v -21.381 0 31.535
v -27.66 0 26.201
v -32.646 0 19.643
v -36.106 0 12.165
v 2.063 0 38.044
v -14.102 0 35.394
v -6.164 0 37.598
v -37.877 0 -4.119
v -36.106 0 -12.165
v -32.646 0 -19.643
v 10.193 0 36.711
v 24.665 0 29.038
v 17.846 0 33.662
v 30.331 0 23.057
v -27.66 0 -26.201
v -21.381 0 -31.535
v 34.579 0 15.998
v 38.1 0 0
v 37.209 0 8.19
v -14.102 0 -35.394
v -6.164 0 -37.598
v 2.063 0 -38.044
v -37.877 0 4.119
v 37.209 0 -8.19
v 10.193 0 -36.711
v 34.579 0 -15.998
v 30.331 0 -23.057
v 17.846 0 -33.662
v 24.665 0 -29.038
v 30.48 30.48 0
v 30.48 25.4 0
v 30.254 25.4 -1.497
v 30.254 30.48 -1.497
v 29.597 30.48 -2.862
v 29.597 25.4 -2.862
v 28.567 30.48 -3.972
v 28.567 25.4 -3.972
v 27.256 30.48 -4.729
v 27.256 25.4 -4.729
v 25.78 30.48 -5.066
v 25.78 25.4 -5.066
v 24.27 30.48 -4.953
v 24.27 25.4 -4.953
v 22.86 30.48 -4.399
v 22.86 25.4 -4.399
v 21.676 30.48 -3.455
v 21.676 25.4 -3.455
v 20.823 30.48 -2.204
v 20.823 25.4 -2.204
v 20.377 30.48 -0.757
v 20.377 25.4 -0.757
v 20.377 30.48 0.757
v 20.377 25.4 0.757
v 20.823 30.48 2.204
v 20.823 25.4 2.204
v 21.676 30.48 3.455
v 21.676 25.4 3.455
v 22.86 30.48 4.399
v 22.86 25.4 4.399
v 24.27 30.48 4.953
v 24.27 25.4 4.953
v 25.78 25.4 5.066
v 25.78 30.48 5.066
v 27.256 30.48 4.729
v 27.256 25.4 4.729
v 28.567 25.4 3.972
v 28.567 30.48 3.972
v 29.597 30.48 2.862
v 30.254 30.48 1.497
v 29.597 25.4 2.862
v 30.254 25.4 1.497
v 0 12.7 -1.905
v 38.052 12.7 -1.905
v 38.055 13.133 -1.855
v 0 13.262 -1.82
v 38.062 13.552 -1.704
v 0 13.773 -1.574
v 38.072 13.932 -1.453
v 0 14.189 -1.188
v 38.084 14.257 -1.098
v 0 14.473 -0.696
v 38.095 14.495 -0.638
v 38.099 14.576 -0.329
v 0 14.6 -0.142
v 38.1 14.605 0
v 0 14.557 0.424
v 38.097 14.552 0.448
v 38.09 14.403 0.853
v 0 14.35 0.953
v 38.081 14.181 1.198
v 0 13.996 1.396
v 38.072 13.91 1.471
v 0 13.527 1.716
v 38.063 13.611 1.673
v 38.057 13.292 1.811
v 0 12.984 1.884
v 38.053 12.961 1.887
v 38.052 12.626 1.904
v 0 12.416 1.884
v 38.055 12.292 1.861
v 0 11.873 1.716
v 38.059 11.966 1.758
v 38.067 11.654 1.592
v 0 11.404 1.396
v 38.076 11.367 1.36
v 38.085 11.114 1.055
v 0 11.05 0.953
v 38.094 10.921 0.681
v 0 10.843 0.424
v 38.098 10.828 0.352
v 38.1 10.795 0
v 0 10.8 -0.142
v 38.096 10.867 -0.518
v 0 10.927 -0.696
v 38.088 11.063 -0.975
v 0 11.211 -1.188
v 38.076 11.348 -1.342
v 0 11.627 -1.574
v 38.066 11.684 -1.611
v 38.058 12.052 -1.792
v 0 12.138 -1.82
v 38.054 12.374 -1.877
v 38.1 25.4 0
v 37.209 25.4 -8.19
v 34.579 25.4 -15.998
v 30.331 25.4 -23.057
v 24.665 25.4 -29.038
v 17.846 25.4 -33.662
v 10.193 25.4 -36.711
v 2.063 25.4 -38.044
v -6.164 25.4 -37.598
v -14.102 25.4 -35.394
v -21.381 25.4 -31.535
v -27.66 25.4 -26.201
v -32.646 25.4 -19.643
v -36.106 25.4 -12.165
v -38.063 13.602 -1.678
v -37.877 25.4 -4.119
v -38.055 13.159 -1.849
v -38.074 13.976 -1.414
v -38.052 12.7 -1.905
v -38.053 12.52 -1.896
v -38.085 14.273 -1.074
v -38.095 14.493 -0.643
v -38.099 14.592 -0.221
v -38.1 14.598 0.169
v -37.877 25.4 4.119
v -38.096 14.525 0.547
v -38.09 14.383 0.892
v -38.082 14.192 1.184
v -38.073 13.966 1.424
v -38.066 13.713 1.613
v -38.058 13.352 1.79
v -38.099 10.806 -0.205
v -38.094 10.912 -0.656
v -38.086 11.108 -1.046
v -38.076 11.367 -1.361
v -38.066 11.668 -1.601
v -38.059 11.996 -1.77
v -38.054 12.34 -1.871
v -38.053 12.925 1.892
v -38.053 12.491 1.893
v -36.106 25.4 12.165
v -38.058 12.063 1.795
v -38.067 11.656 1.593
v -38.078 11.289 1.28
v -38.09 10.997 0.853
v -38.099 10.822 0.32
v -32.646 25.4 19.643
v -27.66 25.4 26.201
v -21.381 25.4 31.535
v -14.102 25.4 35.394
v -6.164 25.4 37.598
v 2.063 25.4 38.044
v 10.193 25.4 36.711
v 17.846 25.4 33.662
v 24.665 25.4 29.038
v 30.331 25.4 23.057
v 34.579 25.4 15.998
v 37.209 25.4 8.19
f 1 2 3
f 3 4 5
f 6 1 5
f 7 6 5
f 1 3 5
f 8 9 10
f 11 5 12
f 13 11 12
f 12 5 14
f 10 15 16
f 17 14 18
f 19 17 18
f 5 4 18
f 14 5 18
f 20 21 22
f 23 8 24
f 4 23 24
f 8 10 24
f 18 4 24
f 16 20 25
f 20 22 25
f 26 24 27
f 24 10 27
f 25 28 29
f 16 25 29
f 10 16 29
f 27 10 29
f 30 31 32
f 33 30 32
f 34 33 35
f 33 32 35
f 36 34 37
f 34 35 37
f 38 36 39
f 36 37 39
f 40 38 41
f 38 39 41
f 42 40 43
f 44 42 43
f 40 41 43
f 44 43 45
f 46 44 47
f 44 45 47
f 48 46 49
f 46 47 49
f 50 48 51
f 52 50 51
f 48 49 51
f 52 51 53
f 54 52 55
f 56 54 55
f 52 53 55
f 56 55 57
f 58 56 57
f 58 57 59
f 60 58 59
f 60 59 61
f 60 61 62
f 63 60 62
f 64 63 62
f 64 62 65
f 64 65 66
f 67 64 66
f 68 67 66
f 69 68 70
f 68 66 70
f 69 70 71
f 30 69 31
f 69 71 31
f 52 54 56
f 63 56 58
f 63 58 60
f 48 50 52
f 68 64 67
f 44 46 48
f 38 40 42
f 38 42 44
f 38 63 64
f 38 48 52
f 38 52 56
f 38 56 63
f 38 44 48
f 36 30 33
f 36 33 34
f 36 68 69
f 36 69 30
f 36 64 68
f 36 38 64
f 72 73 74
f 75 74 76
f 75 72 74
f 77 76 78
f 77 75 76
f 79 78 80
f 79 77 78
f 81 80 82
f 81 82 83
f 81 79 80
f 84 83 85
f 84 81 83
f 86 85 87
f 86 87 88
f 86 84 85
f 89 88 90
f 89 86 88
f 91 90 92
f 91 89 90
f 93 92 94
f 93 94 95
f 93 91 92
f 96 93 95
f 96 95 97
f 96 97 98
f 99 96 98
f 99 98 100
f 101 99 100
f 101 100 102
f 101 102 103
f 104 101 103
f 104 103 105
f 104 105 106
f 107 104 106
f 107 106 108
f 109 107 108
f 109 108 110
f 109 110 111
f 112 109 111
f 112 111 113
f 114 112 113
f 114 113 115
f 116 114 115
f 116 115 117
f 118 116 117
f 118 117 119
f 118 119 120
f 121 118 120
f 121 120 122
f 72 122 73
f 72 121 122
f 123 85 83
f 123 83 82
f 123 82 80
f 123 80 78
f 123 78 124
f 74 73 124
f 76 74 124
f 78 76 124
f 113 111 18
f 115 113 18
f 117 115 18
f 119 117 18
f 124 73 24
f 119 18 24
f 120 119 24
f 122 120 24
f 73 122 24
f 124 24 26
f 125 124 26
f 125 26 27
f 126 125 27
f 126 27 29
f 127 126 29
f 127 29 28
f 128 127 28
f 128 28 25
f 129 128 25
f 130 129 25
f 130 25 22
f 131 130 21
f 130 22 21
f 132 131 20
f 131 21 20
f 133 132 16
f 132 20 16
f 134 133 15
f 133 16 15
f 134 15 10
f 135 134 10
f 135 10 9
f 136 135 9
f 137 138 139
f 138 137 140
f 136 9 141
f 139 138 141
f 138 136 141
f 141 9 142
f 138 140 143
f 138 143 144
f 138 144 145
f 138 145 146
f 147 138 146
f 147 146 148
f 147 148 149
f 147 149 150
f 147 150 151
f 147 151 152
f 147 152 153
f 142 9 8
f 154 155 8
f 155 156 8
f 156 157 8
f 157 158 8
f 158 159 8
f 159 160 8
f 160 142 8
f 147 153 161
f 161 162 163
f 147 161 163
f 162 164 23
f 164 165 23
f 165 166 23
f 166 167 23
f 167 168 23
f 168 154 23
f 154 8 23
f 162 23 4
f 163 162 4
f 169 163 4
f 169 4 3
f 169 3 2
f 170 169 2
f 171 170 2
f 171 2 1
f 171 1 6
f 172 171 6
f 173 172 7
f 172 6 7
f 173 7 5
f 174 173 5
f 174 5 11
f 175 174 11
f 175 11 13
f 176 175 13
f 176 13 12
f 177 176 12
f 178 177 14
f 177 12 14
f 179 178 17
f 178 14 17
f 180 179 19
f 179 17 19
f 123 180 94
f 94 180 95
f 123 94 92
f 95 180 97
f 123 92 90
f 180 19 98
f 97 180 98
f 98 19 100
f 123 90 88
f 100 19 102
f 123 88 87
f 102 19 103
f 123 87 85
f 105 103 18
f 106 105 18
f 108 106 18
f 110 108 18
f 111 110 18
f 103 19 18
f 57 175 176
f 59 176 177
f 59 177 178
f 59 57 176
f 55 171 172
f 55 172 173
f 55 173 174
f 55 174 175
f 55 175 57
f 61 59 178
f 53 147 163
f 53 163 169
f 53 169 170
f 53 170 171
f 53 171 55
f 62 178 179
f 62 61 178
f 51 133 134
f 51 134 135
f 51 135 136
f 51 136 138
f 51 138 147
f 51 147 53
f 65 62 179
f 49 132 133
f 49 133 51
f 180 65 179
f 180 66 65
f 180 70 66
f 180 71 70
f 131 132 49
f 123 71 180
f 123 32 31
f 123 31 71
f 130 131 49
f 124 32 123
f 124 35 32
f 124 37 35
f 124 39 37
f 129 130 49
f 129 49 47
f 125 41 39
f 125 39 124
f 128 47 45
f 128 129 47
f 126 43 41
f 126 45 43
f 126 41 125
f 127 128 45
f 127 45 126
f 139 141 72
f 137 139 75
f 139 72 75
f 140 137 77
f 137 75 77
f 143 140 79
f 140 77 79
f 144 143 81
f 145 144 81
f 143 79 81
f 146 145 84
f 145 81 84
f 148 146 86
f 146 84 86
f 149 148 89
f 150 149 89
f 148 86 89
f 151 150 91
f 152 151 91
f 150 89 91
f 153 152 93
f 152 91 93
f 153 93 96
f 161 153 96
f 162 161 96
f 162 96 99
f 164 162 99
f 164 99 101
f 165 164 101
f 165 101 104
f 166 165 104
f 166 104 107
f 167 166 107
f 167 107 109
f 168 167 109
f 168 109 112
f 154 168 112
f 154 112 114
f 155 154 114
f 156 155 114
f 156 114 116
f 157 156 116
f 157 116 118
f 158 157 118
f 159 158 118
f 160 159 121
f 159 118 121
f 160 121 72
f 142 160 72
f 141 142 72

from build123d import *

# Parameters (mm, degrees)
SKETCH1_R               = 38.1
BOSS_EXTRUDE1_DEPTH     = 25.4
SKETCH2_R               = 5.08
BOSS_EXTRUDE2_DEPTH     = 5.08
SKETCH3_R               = 1.905
CUT_EXTRUDE1_DEPTH      = 46.228
CUT_EXTRUDE1_DEPTH_BACK = 46.482


with BuildPart() as part:
    # Sketch1 → Boss-Extrude1 (new body)
    with BuildSketch(Plane(origin=(0, 0, 0), x_dir=(1, 0, 0), z_dir=(0, 1, 0))):
        Circle(SKETCH1_R)
    extrude(amount=BOSS_EXTRUDE1_DEPTH)

    # Sketch2 → Boss-Extrude2 (add)
    with BuildSketch(Plane(origin=(0, 25.4, 0), x_dir=(1, 0, 0), z_dir=(0, 1, 0))):
        with Locations((25.4, 0)):
            Circle(SKETCH2_R)
    extrude(amount=BOSS_EXTRUDE2_DEPTH)

    # Sketch3 → Cut-Extrude1 (cut, two sides)
    with BuildSketch(Plane(origin=(0, 0, 0), x_dir=(0, 0, -1), z_dir=(1, 0, 0))) as cut_extrude1_sk:
        with Locations((0, 12.7)):
            Circle(SKETCH3_R)
    extrude(amount=CUT_EXTRUDE1_DEPTH, mode=Mode.SUBTRACT)
    extrude(cut_extrude1_sk.sketch, amount=-CUT_EXTRUDE1_DEPTH_BACK, mode=Mode.SUBTRACT)


solid = part.part
